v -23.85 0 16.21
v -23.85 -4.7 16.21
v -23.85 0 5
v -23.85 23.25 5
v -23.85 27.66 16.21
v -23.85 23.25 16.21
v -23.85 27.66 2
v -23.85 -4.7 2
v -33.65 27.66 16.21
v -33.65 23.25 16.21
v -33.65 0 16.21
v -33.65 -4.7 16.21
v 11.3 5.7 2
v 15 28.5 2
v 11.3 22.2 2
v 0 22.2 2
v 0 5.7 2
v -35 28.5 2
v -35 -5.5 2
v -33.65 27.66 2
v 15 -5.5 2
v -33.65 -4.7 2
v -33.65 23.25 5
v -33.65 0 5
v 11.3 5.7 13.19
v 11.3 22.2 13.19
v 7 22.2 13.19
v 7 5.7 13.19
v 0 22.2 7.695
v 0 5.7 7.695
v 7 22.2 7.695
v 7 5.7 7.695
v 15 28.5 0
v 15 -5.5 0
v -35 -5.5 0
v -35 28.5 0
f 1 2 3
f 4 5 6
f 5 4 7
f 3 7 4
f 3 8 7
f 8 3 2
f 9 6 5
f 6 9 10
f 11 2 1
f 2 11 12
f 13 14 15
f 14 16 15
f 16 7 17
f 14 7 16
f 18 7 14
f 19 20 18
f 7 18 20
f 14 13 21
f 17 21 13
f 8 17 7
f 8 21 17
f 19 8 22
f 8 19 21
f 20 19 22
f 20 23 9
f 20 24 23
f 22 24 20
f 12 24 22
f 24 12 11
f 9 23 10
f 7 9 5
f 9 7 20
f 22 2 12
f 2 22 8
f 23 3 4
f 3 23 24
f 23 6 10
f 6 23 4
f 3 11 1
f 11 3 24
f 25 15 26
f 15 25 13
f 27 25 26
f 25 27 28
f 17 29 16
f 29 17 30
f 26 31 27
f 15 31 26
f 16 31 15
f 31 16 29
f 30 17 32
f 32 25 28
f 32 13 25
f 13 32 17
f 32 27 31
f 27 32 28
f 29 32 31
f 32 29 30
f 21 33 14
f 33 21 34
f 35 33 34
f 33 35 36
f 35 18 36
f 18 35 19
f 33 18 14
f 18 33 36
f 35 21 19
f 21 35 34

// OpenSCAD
module ServoBracket() {
difference() {
translate([0,-4.7,0])
cube(size=[9.8,32.36,14.21]);
translate([-1,0,3])
cube(size=[11,23.25,12.21]);
}
}
module ValveBracket() {
difference() {
translate([0,5.7,-4])
cube(size=[11.3,16.50,12.495]);
translate([-.3,5.5,3])
cube(size=[7.3,17,6]);
}
}

translate([-33.65,0,2])
ServoBracket();
translate([0,0,4.695])
ValveBracket();

translate([-35,-5.5,0])
cube(size=[50,34,2]);
